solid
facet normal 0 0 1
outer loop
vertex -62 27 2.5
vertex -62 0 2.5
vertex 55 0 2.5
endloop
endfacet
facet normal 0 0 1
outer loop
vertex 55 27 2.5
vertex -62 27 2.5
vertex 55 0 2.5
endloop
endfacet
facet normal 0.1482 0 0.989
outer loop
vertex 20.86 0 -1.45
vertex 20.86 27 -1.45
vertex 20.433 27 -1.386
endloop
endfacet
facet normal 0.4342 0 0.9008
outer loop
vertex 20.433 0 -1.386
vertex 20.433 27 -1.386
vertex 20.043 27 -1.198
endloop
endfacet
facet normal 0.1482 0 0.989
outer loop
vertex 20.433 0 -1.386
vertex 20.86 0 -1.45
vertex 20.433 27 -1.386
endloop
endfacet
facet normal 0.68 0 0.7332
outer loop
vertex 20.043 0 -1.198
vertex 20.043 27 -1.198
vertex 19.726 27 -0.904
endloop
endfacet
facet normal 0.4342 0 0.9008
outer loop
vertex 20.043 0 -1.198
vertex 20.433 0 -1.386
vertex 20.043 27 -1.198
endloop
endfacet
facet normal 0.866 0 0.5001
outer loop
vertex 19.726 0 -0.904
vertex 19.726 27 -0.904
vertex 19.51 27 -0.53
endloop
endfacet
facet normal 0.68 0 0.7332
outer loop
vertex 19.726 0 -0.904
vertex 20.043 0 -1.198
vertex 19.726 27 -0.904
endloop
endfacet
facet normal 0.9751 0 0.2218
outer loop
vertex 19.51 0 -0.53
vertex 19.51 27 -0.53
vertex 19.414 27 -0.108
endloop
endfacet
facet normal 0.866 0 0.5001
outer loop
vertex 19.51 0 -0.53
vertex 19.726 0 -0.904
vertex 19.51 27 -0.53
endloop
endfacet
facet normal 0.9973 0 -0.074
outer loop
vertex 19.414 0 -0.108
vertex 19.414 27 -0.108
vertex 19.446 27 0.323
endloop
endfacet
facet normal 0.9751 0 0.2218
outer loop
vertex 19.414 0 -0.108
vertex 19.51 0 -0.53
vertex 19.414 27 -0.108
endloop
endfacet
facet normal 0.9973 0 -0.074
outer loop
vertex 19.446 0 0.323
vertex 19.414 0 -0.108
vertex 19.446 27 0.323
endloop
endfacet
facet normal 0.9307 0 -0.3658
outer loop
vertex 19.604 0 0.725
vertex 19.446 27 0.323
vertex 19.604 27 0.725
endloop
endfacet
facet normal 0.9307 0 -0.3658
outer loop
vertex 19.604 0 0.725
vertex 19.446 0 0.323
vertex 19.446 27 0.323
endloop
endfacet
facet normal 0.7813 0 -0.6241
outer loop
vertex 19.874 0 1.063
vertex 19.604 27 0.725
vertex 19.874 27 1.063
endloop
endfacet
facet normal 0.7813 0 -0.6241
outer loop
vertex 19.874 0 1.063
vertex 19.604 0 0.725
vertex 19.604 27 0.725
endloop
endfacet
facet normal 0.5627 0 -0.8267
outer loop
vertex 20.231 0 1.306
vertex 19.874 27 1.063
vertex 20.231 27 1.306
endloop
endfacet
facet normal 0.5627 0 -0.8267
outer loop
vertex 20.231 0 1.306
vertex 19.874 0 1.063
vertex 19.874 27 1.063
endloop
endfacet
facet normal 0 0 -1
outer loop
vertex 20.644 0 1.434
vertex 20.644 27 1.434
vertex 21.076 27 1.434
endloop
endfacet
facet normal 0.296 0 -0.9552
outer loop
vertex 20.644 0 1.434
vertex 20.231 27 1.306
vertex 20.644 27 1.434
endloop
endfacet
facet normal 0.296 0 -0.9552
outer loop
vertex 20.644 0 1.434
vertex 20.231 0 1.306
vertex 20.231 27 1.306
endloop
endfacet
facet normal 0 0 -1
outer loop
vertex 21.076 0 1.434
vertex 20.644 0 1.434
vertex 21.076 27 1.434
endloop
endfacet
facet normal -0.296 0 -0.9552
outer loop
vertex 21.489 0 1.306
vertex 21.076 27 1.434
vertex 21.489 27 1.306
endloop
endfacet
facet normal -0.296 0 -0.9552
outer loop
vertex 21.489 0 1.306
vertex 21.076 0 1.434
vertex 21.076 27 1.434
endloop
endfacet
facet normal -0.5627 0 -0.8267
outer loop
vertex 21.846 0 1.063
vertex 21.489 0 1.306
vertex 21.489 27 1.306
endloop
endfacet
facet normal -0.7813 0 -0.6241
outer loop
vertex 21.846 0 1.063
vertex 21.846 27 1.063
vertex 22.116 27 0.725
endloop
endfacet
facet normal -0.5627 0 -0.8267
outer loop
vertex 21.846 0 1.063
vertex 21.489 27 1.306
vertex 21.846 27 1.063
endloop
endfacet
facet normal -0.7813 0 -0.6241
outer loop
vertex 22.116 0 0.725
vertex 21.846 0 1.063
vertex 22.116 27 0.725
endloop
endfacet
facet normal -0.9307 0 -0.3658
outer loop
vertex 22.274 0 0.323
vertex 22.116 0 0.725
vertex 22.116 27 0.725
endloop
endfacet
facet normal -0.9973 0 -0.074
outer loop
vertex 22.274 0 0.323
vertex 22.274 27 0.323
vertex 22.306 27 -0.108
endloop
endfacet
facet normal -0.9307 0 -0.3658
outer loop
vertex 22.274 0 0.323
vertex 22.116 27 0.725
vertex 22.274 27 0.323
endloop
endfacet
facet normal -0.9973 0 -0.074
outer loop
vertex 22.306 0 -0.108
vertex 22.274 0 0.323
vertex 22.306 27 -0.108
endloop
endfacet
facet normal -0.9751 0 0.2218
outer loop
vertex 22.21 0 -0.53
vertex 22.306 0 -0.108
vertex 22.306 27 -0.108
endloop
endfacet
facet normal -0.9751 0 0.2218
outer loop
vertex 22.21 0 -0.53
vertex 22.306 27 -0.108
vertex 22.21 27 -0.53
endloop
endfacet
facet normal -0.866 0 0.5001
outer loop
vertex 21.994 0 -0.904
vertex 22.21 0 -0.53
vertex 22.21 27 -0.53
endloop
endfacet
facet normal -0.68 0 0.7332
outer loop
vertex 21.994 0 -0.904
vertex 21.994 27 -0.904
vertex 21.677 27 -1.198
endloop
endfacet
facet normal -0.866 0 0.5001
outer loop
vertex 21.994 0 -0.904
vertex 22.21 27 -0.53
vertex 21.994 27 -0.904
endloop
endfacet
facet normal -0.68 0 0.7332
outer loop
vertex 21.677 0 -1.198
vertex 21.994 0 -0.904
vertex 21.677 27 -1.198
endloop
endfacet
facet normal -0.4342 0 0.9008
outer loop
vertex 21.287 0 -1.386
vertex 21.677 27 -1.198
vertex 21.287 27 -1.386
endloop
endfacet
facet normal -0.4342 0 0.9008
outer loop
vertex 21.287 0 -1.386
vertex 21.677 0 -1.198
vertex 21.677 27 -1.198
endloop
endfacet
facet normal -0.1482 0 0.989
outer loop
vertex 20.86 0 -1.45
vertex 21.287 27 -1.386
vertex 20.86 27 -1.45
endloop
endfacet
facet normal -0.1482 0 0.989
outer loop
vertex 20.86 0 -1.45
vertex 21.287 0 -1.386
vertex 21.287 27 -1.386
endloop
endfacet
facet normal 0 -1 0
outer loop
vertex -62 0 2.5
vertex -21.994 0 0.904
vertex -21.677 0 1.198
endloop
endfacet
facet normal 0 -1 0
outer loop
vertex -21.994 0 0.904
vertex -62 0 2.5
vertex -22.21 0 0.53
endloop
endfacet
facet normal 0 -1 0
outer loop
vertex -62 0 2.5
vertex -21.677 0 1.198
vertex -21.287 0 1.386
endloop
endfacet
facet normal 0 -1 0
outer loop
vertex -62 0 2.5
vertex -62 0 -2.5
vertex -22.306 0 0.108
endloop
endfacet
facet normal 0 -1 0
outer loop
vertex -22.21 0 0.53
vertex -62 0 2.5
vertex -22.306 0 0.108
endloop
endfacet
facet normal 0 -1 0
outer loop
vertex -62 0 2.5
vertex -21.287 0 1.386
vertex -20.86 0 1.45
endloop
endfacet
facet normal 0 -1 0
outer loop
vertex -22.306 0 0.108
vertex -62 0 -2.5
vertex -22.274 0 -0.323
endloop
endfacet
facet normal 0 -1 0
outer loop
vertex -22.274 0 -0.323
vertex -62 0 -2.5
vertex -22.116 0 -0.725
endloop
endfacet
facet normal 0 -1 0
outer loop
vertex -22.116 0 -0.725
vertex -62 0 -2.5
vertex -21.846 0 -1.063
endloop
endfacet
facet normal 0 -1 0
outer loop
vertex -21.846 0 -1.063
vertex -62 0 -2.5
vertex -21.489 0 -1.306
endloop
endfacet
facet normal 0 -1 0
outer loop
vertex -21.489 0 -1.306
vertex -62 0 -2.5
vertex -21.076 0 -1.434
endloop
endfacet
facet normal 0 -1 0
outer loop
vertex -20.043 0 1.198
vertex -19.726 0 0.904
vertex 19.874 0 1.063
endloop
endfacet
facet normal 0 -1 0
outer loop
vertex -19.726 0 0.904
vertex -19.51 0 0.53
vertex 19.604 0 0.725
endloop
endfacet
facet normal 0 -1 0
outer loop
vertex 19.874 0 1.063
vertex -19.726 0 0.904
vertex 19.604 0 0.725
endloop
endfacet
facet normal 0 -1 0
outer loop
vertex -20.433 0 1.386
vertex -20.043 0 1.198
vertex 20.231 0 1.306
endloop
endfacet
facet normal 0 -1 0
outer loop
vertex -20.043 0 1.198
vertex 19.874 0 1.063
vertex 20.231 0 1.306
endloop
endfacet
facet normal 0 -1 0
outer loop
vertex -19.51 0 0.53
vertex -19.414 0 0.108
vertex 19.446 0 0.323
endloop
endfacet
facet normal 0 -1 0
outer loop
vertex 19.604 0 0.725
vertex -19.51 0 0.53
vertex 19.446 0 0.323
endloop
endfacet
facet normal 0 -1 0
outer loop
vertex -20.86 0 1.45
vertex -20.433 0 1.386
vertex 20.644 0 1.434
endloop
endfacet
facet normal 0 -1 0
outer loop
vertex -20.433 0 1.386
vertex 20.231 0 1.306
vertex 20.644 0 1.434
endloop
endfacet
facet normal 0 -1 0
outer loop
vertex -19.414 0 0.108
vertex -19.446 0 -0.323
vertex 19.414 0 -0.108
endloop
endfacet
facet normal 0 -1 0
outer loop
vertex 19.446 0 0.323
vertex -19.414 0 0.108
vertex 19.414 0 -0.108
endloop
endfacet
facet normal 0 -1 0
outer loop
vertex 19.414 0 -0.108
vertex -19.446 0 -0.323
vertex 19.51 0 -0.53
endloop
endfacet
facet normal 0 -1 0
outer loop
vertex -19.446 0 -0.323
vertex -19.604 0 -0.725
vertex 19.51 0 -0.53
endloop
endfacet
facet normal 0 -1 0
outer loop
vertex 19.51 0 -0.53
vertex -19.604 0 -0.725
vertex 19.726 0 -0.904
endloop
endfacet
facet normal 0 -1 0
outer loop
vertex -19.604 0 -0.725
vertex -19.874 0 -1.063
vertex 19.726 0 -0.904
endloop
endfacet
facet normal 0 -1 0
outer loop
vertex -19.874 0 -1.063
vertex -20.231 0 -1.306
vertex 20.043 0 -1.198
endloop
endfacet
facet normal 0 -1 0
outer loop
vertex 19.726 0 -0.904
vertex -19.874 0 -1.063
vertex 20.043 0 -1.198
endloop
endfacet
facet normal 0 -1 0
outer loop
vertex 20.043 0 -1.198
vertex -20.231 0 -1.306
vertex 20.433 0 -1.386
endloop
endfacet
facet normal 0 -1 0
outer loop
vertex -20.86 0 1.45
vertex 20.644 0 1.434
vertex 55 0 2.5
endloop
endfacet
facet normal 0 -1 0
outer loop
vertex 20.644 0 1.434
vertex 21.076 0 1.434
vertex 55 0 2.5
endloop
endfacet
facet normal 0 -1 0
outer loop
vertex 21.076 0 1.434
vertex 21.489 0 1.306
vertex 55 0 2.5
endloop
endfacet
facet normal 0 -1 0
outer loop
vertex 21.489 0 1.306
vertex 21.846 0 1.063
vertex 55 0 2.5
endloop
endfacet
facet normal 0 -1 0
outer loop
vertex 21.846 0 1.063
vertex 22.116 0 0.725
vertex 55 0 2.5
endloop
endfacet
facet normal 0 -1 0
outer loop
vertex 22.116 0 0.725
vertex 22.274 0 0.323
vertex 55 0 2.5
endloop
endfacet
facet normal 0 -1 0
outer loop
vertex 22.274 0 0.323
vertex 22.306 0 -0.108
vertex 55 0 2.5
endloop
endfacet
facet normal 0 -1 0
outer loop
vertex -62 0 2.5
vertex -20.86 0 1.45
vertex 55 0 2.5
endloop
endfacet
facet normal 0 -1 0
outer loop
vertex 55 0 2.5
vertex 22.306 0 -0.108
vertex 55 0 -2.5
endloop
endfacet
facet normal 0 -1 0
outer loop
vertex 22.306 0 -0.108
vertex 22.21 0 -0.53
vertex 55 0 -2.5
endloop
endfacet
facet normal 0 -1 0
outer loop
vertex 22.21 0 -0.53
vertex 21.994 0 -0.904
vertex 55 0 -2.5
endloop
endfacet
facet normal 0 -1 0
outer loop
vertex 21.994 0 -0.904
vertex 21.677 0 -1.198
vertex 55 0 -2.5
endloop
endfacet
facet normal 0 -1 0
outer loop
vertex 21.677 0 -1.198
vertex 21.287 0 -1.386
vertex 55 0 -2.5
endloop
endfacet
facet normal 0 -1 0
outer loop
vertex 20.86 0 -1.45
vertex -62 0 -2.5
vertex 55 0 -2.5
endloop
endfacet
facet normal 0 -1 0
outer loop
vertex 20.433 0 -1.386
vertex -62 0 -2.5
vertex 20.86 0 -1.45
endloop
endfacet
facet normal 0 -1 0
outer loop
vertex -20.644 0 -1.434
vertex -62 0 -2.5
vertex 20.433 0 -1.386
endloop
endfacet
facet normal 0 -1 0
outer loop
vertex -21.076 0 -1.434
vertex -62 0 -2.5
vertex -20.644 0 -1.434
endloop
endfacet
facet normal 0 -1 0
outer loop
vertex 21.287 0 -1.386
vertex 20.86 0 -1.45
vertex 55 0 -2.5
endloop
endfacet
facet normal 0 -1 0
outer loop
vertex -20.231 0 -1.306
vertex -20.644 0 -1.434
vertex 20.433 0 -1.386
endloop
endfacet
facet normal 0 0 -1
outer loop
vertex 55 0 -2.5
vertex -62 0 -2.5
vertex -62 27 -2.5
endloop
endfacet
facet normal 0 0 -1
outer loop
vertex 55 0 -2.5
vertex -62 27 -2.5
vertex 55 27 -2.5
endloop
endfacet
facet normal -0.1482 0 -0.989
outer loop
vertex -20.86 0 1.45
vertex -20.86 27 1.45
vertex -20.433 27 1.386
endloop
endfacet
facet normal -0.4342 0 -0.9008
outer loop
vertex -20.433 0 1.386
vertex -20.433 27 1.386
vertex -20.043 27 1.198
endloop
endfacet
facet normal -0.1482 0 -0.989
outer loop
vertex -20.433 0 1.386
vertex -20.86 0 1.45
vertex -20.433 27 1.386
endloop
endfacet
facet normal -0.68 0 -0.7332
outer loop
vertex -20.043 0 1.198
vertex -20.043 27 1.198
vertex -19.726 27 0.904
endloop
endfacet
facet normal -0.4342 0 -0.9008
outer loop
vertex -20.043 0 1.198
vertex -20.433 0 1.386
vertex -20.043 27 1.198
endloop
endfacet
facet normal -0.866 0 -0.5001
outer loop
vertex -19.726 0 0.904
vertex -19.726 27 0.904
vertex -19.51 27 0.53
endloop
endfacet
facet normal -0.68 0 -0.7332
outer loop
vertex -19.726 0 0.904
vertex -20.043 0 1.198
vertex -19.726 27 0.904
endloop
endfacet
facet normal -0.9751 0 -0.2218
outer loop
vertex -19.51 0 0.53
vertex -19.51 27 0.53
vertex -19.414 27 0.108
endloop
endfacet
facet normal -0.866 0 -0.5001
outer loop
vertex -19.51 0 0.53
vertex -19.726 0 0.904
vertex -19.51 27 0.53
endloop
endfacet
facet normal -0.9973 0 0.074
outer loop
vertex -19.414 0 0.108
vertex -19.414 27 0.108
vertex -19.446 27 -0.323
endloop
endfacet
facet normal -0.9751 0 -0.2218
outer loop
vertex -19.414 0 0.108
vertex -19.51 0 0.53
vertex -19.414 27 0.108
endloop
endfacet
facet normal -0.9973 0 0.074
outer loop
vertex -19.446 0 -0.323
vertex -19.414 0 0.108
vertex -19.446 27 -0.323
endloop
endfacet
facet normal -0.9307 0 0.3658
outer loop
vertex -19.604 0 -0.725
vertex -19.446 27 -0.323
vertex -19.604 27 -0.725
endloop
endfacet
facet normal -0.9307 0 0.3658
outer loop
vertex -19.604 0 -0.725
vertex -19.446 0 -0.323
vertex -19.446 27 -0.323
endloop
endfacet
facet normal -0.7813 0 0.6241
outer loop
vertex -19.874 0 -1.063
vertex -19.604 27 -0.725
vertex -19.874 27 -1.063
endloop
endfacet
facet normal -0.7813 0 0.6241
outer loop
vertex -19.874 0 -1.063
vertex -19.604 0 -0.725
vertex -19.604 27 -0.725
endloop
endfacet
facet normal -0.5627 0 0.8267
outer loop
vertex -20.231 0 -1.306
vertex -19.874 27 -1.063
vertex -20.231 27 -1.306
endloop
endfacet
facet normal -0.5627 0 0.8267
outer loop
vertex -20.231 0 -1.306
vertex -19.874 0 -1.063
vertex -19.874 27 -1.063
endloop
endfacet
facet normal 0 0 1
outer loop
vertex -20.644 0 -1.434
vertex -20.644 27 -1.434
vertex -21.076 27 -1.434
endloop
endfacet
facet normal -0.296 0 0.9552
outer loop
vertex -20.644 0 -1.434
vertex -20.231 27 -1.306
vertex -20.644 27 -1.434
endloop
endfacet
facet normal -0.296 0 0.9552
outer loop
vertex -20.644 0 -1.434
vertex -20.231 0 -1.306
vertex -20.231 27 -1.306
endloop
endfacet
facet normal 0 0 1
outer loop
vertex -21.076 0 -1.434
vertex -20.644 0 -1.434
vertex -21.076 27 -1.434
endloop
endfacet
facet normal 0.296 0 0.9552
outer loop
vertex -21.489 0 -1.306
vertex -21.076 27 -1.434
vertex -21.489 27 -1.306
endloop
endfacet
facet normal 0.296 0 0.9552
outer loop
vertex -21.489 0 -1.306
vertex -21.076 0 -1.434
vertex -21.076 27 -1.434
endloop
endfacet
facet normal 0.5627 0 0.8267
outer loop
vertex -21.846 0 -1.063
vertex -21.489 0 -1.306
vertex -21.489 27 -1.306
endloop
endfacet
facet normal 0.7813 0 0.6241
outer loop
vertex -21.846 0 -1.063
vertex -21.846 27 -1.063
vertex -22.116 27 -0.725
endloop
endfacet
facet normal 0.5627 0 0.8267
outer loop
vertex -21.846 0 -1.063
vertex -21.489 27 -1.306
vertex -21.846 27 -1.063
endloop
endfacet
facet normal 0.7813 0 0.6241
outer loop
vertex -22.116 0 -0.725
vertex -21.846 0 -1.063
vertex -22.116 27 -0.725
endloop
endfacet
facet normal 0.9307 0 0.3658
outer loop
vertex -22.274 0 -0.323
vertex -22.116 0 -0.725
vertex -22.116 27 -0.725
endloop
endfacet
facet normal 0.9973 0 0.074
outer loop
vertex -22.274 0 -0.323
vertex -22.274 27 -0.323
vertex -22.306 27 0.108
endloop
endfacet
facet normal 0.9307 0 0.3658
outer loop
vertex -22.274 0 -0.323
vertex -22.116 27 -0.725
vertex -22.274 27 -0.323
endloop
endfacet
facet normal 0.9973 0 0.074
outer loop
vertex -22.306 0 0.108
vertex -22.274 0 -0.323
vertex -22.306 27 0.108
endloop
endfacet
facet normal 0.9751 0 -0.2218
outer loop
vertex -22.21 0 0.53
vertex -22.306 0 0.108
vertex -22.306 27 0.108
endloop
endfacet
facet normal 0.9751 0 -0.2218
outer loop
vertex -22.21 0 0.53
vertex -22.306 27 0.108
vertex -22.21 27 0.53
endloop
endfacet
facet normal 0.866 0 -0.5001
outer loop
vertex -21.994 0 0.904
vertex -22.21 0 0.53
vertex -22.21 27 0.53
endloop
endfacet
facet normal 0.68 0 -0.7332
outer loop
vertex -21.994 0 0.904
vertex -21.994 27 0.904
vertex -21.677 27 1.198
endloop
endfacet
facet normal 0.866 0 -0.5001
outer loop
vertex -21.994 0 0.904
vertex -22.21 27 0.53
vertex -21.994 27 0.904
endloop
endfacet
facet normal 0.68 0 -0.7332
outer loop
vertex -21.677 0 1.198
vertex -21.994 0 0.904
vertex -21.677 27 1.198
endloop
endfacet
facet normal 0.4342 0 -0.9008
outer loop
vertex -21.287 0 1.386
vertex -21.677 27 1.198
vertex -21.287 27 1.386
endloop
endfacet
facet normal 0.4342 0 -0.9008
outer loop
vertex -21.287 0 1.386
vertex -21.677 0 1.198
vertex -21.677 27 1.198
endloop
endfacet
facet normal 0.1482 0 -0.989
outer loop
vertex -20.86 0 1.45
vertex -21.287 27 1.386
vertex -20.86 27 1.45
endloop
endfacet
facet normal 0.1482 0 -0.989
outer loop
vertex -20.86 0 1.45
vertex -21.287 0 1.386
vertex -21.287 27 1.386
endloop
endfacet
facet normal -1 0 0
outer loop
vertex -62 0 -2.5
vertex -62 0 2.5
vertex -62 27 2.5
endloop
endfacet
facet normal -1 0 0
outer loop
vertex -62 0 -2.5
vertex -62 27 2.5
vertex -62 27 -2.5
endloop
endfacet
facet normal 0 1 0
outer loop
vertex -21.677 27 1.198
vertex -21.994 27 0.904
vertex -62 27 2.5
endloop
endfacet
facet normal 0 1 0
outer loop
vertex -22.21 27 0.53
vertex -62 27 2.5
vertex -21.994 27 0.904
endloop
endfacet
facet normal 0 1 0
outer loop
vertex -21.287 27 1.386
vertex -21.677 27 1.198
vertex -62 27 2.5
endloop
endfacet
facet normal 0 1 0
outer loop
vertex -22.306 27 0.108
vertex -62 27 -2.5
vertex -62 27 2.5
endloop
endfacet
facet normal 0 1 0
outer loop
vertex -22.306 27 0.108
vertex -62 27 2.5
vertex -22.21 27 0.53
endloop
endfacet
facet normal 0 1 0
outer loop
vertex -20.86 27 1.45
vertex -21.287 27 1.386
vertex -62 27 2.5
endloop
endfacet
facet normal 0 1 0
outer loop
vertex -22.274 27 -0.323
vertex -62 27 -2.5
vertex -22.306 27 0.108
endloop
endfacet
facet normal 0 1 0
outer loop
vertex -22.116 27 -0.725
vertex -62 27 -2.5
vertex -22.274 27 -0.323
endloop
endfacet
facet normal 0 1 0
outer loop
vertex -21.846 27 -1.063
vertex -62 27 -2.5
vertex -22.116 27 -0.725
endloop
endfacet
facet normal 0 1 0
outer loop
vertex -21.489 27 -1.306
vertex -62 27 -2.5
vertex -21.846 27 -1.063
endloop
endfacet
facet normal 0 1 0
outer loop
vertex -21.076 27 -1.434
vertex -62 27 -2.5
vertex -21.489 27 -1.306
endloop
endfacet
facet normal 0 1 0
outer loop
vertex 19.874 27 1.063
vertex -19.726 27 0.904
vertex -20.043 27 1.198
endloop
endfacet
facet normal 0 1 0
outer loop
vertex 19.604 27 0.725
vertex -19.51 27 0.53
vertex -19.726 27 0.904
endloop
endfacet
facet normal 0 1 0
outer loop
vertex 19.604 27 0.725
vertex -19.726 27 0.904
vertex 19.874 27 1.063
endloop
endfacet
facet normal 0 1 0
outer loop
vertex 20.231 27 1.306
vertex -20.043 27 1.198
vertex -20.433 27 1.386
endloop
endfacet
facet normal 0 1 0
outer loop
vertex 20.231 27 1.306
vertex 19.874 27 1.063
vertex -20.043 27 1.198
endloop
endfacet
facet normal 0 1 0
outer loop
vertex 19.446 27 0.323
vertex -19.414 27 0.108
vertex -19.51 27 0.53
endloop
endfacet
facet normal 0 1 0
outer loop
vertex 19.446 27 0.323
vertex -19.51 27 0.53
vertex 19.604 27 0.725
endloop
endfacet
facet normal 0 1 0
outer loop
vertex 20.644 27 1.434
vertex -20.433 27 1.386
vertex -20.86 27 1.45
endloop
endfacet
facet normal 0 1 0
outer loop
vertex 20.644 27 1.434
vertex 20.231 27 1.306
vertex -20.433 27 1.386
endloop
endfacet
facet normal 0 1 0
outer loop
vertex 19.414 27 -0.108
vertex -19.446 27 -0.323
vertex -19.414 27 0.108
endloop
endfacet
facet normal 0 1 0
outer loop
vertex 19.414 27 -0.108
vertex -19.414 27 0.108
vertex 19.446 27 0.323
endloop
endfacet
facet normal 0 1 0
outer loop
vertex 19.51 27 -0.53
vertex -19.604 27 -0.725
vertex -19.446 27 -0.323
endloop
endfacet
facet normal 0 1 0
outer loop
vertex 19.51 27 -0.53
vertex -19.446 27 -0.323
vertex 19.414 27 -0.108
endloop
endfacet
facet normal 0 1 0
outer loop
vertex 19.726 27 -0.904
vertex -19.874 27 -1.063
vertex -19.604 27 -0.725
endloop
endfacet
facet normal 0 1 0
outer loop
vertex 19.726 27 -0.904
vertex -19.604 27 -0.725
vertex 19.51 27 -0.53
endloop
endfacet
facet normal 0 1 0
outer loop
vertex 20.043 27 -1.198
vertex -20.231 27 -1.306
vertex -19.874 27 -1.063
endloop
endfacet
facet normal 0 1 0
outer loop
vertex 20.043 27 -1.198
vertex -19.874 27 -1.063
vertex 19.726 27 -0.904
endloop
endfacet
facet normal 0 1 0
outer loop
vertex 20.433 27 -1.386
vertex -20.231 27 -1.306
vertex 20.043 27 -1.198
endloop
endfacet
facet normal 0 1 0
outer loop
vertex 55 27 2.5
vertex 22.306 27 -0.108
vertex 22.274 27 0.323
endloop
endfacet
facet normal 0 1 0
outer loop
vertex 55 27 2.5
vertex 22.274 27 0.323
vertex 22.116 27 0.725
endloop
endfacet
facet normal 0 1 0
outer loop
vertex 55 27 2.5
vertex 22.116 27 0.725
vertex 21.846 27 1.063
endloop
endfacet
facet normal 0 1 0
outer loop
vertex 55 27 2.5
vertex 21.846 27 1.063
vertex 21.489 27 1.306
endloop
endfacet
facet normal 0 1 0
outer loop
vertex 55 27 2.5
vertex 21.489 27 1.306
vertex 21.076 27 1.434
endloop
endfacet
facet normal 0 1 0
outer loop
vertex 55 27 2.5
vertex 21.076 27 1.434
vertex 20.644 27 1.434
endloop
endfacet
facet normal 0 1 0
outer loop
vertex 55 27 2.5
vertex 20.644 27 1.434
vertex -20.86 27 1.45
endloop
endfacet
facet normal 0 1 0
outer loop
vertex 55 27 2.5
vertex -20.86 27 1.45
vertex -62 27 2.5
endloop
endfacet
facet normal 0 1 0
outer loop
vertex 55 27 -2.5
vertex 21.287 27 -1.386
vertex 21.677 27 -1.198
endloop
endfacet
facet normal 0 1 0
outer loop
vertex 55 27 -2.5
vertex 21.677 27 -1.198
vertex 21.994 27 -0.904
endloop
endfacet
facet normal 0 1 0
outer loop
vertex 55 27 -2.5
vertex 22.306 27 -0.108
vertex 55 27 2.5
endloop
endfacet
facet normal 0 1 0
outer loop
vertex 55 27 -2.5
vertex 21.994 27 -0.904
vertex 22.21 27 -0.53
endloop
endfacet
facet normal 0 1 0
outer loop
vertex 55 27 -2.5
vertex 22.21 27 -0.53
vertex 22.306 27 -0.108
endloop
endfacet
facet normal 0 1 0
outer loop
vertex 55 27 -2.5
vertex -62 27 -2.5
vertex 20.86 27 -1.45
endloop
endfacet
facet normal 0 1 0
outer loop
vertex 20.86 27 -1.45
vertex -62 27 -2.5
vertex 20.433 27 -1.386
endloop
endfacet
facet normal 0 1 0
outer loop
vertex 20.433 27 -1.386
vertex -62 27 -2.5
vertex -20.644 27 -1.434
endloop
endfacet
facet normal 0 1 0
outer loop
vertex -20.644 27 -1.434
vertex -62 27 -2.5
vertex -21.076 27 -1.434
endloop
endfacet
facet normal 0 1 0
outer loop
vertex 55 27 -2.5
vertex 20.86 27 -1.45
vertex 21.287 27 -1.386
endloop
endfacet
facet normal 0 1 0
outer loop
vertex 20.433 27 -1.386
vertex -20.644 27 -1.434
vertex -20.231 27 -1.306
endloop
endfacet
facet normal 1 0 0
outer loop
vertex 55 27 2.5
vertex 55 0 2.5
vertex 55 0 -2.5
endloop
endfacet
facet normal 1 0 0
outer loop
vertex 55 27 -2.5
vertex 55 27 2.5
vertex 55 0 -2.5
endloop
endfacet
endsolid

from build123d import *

# Parameters (mm, degrees)
SKETCH_1_W          = 117
SKETCH_1_H          = 5
EXTRUDE_1_DEPTH     = 27
SKETCH_2_R          = 1.45
CUT_EXTRUDE_1_DEPTH = 30


with BuildPart() as part:
    # 草图1 → 凸台-拉伸1 (new body)
    with BuildSketch(Plane(origin=(0, 0, 0), x_dir=(1, 0, 0), z_dir=(0, 1, 0))):
        with Locations((-3.5, 0)):
            Rectangle(SKETCH_1_W, SKETCH_1_H)
    extrude(amount=EXTRUDE_1_DEPTH)

    # 草图2 → 切除-拉伸1 (cut)
    with BuildSketch(Plane(origin=(0, 0, 0), x_dir=(1, 0, 0), z_dir=(0, 1, 0))):
        with Locations(Location((-20.86, 0, 0), (0, 0, 270))):
            Circle(SKETCH_2_R)
        with Locations(Location((20.86, 0, 0), (0, 0, 90))):
            Circle(SKETCH_2_R)
    extrude(amount=CUT_EXTRUDE_1_DEPTH, mode=Mode.SUBTRACT)


solid = part.part
